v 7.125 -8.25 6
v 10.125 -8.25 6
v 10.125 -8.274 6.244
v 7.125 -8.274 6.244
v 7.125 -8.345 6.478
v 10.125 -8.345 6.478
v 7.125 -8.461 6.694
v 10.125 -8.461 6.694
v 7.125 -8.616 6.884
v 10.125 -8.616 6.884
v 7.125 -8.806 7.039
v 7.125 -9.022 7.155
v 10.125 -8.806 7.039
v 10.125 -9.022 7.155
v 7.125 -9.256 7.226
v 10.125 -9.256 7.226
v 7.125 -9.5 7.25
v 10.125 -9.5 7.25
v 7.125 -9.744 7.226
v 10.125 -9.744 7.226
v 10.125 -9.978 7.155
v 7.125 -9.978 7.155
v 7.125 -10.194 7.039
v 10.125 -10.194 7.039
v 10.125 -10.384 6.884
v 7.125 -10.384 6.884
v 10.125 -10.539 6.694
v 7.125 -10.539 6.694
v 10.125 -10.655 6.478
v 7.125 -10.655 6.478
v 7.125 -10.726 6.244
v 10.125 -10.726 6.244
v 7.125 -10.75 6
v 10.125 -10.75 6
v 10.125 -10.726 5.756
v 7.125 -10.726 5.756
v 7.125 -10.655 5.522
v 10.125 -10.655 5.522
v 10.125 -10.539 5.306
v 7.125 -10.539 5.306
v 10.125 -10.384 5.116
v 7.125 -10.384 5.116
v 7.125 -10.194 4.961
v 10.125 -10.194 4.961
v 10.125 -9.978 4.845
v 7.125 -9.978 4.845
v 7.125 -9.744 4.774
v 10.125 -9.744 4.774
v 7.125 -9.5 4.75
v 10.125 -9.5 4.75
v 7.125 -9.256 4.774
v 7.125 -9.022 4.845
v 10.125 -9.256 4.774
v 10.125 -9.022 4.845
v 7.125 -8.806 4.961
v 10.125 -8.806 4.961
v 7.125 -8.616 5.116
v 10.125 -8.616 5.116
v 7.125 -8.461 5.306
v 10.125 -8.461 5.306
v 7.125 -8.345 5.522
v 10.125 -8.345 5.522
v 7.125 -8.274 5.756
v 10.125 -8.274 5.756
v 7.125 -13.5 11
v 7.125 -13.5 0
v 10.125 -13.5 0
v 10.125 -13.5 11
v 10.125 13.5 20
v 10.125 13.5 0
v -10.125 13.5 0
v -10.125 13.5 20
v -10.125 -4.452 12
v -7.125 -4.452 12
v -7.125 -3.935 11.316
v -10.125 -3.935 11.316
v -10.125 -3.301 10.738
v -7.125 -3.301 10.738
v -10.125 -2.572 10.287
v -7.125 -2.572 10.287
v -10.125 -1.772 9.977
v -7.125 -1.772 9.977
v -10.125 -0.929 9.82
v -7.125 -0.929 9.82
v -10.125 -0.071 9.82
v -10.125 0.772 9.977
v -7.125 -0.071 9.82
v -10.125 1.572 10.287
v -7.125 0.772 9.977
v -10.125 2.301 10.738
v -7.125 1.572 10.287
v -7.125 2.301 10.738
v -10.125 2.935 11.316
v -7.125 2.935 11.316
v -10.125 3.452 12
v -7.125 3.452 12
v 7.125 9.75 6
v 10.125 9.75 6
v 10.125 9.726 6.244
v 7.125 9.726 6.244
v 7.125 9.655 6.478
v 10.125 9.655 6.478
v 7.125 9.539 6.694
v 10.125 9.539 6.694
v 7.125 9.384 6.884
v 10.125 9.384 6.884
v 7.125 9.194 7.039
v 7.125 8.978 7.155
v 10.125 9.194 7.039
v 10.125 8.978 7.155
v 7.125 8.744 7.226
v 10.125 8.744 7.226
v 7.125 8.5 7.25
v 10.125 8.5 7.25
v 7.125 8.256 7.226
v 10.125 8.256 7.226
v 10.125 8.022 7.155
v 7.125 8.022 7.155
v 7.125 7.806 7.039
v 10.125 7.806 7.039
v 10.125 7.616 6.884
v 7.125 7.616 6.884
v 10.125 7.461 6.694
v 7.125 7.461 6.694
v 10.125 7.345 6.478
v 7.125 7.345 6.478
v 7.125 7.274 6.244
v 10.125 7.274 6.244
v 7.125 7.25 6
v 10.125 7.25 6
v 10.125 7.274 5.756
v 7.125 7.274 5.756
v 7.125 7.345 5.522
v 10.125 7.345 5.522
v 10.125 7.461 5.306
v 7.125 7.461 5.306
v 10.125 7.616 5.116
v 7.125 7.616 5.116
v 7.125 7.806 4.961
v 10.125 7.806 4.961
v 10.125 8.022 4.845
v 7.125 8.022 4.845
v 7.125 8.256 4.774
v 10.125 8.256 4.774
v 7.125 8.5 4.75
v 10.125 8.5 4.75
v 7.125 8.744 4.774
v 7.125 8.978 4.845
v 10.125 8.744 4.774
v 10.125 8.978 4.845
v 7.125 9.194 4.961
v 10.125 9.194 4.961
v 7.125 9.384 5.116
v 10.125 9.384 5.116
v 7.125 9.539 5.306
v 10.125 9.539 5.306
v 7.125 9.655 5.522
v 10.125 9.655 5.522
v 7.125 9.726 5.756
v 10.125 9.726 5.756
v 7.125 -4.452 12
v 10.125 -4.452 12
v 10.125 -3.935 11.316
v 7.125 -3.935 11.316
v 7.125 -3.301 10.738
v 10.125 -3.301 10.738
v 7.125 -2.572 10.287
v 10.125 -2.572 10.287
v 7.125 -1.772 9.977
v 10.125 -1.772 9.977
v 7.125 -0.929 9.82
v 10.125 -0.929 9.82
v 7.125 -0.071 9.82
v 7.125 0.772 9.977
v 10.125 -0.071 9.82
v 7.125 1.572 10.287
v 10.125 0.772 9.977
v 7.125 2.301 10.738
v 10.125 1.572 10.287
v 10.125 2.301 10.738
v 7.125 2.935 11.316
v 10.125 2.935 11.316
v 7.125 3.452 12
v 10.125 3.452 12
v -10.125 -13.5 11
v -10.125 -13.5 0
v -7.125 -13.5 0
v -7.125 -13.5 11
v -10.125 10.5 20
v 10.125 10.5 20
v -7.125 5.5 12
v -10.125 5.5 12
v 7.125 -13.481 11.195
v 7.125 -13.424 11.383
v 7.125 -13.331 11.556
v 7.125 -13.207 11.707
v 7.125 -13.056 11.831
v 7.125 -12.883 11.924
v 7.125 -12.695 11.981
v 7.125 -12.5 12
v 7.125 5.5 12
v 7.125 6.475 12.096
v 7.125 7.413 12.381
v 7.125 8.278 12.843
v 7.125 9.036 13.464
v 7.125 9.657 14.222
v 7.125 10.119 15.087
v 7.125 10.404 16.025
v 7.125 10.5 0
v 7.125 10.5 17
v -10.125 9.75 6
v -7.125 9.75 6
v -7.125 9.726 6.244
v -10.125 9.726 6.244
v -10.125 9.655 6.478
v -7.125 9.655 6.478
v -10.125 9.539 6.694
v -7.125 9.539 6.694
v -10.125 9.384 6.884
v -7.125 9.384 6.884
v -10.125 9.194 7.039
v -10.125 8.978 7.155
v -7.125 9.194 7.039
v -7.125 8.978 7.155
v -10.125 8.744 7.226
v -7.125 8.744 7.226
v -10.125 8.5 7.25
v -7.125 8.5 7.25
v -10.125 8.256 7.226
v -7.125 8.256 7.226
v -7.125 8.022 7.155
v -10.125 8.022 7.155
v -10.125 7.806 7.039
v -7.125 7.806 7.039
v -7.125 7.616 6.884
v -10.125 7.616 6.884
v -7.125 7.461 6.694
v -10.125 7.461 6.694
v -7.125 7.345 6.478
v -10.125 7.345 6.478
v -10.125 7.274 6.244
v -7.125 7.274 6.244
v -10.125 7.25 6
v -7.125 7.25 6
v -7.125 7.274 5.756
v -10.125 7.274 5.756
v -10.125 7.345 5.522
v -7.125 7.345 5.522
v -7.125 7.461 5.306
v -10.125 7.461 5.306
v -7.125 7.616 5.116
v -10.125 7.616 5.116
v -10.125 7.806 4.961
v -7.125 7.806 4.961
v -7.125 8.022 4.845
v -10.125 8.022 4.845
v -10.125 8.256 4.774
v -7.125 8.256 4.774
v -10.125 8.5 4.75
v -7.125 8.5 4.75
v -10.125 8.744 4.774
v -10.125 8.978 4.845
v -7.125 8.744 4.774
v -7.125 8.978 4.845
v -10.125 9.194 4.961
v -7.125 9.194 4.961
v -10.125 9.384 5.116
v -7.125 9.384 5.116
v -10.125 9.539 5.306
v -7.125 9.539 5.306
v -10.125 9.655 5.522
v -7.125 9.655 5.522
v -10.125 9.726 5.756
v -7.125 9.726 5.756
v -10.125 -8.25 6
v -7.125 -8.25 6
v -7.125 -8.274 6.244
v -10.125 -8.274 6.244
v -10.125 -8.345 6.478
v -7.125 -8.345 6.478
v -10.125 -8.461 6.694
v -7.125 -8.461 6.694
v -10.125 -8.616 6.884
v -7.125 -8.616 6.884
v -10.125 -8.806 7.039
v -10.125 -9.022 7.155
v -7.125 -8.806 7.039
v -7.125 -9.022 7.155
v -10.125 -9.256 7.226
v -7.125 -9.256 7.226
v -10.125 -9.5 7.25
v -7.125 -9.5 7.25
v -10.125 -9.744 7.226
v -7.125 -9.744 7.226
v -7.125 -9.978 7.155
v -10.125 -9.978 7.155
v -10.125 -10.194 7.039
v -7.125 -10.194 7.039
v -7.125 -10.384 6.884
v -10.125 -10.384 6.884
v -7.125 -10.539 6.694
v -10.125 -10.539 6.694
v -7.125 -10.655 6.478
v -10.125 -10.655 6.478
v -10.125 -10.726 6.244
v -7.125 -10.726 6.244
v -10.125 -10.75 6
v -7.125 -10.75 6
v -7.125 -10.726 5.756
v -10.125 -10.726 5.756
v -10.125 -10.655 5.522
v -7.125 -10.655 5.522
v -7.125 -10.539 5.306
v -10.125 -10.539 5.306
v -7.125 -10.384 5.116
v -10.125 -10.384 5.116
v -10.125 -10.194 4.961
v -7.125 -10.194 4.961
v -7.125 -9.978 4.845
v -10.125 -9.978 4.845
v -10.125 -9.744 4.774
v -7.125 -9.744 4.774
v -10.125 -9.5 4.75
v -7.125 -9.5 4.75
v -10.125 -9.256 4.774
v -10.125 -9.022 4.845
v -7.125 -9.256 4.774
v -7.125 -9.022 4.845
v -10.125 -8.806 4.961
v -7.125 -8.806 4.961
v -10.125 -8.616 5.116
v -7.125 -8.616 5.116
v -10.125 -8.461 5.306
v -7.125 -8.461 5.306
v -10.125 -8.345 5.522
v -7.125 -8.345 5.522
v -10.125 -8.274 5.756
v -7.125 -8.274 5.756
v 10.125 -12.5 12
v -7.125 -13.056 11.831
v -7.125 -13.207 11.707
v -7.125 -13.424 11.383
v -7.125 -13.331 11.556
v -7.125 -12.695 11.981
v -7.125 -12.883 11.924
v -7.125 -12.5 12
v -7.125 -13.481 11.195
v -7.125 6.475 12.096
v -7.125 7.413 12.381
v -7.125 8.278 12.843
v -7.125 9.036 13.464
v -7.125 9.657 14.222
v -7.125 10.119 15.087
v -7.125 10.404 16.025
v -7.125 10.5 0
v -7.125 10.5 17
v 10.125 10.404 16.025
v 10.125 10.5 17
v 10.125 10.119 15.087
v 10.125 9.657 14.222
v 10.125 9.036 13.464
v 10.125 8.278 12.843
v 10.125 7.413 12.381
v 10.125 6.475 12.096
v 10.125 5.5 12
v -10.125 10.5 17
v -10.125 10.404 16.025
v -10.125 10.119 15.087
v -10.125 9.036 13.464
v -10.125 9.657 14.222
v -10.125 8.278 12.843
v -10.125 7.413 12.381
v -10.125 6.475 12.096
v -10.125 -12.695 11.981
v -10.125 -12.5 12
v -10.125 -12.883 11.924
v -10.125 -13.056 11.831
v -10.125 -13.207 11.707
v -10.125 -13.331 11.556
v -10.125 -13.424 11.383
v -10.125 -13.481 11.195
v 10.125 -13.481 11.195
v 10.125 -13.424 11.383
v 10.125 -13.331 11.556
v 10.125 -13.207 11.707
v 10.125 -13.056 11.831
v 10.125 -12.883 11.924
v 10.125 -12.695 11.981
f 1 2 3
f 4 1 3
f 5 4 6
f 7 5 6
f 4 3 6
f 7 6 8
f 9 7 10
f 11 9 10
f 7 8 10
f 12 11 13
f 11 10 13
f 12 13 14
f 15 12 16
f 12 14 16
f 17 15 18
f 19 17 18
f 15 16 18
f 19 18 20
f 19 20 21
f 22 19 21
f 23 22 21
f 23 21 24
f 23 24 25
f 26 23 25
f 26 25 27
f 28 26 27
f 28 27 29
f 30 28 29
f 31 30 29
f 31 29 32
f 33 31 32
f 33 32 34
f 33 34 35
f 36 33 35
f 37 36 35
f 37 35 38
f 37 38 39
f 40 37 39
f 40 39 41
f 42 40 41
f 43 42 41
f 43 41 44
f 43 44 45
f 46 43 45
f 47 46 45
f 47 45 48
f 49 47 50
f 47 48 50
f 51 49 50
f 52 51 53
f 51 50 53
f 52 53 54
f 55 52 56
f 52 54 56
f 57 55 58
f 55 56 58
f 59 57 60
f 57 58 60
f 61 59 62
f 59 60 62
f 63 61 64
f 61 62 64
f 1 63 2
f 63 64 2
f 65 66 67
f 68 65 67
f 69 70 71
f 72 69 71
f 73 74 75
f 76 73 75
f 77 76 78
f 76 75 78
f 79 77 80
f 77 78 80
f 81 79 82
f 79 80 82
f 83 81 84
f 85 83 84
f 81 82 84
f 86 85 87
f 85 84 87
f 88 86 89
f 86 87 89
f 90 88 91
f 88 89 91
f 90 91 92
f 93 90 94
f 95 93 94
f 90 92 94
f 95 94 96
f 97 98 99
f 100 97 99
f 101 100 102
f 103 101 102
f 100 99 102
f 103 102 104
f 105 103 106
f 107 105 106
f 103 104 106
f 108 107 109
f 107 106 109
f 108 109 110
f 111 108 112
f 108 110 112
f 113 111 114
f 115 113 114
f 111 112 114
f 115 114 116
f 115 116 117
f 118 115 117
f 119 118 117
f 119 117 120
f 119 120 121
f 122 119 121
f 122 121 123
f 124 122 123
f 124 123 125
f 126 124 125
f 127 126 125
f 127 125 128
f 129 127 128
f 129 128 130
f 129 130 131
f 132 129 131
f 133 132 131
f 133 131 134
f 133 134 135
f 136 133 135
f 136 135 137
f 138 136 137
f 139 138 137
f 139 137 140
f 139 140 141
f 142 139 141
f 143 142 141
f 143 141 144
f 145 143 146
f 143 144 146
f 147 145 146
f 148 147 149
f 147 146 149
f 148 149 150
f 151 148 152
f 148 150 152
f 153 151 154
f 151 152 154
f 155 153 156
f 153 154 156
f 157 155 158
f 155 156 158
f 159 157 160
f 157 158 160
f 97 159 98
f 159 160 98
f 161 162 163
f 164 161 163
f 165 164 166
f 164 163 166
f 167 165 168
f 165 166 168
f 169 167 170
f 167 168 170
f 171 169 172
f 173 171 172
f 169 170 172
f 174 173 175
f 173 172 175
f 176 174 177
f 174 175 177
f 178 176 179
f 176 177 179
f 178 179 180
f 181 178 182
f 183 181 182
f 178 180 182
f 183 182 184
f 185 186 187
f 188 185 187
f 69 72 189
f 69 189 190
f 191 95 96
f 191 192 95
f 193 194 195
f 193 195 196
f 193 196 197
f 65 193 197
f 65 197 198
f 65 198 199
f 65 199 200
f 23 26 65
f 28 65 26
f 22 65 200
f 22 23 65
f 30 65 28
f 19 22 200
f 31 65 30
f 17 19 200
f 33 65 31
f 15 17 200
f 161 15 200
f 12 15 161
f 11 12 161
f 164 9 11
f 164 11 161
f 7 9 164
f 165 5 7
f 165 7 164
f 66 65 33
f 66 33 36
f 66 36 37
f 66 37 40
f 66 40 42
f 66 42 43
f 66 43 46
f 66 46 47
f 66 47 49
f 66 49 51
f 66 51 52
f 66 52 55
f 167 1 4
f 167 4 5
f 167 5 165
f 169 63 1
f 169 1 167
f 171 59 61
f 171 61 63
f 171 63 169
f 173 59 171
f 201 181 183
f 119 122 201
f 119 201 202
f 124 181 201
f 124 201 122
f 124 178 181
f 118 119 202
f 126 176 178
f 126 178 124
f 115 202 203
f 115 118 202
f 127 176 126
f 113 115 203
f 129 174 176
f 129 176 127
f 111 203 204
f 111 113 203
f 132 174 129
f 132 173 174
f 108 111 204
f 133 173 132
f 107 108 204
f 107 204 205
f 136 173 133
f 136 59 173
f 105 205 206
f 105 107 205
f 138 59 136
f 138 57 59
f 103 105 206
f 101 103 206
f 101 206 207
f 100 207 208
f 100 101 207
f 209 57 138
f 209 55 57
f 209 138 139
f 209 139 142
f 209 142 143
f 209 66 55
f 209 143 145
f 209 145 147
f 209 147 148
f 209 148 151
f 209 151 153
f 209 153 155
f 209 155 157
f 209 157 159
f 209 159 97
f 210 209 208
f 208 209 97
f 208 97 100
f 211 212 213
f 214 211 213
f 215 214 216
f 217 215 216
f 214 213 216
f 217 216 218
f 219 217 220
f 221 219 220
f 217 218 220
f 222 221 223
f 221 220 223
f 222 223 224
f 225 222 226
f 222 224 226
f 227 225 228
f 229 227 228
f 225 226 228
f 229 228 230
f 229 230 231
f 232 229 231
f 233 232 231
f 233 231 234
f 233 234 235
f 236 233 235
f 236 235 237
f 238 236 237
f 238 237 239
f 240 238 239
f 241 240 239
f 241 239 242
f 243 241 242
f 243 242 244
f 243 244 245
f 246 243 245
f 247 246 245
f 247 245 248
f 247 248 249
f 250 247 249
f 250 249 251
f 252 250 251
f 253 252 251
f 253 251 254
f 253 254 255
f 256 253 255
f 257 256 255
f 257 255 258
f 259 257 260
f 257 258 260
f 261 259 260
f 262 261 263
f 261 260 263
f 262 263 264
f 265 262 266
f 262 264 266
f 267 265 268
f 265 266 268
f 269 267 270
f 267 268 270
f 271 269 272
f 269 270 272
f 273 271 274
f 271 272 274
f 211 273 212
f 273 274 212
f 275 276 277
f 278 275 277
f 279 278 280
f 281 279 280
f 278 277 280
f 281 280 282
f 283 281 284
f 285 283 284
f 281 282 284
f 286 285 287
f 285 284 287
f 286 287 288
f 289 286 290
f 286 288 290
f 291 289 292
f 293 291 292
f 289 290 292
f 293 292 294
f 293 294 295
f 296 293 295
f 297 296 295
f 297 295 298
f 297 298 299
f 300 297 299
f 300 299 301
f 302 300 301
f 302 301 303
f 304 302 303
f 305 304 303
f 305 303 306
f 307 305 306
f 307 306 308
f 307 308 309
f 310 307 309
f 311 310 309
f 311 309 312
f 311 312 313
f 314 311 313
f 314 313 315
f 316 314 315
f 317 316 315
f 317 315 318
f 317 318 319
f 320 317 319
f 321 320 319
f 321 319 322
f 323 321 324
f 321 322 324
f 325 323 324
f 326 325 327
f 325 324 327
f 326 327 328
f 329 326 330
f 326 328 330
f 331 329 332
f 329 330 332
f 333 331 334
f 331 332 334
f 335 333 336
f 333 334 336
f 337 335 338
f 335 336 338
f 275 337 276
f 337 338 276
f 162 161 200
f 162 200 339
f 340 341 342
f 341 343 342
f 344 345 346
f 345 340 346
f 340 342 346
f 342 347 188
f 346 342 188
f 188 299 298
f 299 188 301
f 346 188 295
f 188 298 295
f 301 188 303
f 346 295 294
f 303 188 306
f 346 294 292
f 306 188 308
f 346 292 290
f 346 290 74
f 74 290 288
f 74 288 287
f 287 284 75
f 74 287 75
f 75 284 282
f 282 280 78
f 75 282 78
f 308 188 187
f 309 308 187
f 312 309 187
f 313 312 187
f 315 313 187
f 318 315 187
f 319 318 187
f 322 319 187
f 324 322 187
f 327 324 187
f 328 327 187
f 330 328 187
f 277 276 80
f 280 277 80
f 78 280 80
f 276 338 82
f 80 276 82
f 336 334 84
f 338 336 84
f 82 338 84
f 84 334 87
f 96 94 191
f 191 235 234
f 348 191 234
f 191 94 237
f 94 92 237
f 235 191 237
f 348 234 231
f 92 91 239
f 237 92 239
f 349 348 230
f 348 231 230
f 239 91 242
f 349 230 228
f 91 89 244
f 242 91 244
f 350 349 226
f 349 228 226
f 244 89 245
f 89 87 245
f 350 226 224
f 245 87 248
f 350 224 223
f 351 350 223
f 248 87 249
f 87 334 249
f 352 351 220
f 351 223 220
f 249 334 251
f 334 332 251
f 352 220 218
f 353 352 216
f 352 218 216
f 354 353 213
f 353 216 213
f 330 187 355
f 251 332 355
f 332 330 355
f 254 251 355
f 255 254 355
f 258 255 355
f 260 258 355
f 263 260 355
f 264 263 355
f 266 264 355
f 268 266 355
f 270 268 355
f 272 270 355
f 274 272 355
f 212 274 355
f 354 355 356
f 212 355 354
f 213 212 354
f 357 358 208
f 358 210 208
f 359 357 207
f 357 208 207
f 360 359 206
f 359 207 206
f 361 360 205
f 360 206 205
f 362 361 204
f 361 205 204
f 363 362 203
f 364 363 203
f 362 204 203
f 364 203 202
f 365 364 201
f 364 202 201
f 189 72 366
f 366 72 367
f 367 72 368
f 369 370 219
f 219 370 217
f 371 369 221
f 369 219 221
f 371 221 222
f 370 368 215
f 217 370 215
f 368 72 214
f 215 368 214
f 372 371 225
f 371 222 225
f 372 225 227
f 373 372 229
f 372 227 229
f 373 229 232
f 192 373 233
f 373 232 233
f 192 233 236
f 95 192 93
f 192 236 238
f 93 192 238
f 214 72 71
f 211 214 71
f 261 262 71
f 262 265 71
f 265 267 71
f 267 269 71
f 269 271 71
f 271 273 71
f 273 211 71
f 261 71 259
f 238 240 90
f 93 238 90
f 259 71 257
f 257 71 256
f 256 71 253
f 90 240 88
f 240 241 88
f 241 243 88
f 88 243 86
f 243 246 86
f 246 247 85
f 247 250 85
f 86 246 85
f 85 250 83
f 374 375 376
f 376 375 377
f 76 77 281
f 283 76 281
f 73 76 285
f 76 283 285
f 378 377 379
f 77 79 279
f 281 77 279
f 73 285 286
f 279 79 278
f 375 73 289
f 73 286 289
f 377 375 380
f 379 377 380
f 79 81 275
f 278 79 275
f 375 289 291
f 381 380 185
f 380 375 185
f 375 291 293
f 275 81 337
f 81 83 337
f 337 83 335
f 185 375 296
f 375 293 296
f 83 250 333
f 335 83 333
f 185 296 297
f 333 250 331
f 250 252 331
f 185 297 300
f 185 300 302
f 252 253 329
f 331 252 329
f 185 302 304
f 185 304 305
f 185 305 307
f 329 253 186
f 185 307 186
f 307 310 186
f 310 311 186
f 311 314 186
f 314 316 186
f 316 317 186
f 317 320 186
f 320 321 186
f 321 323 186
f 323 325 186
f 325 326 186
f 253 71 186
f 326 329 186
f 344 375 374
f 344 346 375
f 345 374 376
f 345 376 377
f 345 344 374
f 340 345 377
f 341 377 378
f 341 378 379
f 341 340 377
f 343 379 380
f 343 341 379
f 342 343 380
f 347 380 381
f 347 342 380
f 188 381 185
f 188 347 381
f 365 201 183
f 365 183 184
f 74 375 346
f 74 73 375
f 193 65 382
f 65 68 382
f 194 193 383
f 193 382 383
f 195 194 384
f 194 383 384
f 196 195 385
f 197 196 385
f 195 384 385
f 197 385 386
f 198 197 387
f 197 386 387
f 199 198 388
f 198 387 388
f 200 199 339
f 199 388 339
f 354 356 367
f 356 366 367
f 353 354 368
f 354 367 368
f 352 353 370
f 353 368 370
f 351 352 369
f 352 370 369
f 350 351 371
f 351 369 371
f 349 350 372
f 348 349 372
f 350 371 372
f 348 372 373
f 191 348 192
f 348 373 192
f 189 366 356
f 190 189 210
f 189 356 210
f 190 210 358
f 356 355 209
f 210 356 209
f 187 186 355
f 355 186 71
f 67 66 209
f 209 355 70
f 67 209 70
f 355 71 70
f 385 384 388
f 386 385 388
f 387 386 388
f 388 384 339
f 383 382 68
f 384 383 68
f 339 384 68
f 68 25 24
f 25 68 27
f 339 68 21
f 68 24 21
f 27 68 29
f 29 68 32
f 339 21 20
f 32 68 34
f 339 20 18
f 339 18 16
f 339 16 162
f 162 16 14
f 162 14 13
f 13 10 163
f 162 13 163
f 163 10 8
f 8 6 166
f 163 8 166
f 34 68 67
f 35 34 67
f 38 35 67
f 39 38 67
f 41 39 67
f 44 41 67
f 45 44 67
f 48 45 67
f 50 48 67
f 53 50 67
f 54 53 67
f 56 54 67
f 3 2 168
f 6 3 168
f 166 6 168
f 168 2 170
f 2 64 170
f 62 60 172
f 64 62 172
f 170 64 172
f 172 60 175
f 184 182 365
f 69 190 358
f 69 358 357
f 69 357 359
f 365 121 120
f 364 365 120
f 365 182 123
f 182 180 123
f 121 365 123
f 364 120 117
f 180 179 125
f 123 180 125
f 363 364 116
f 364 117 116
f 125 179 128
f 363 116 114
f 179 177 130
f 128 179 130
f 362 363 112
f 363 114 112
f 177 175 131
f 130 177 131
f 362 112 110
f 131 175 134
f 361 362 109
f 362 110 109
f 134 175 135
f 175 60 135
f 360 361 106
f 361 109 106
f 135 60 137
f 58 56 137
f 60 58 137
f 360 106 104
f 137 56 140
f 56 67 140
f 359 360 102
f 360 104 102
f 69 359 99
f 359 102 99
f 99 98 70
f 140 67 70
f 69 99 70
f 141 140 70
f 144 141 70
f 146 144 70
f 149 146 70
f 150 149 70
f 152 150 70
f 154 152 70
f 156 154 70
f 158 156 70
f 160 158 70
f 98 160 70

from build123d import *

# Parameters (mm, degrees)
F0_W     = 3
F0_H     = 24
F1_DEPTH = 12
F2_R     = 1.25
F3_DEPTH = 150
F4_DEPTH = 20
F5_R     = 5
F6_R     = 1
F7_DEPTH = 150


# Not quite as in the source:
# - a feature names something its author has since deleted; it is built from what else it names


with BuildPart() as f1:
    # F0 (on Top) → F1 (new body)
    with BuildSketch(Plane.XY):
        with Locations((8.625, -1.5)):
            Rectangle(F0_W, F0_H)
        with Locations((-8.625, -1.5)):
            Rectangle(F0_W, F0_H)
        Polygon((10.125, 13.5), (-10.125, 13.5), (-10.125, 10.5), (-7.125, 10.5), (7.125, 10.5), (10.125, 10.5), align=None)
    extrude(amount=F1_DEPTH)

    # F2 (on face) → F3 (cut)
    with BuildSketch(Plane.YZ.offset(10.125)):
        with Locations((-9.5, 6)):
            Circle(F2_R)
        with Locations((8.5, 6)):
            Circle(F2_R)
    extrude(amount=-F3_DEPTH, mode=Mode.SUBTRACT)

    # F0 (on Top) → F4 (join)
    with BuildSketch(Plane.XY):
        Polygon((10.125, 13.5), (-10.125, 13.5), (-10.125, 10.5), (-7.125, 10.5), (7.125, 10.5), (10.125, 10.5), align=None)
    extrude(amount=F4_DEPTH)

    # F5
    f5_edges = [f1.edges().sort_by_distance(p)[0] for p in [
        (8.625, 10.5, 12),
        (-8.625, 10.5, 12),
    ]]
    fillet(f5_edges, radius=F5_R)

    # F6
    f6_edges = [f1.edges().sort_by_distance(p)[0] for p in [
        (8.625, -13.5, 12),
        (-8.625, -13.5, 12),
    ]]
    fillet(f6_edges, radius=F6_R)

    # F2 (on face) → F7 (cut)
    with BuildSketch(Plane.YZ.offset(10.125)):
        with BuildLine():
            ThreePointArc((-4.4522145691, 12), (-0.5, 9.8), (3.4522145691, 12))
            Line((3.4522145691, 12), (-4.4522145691, 12))
        make_face()
    extrude(amount=-F7_DEPTH, mode=Mode.SUBTRACT)


solid = f1.part
